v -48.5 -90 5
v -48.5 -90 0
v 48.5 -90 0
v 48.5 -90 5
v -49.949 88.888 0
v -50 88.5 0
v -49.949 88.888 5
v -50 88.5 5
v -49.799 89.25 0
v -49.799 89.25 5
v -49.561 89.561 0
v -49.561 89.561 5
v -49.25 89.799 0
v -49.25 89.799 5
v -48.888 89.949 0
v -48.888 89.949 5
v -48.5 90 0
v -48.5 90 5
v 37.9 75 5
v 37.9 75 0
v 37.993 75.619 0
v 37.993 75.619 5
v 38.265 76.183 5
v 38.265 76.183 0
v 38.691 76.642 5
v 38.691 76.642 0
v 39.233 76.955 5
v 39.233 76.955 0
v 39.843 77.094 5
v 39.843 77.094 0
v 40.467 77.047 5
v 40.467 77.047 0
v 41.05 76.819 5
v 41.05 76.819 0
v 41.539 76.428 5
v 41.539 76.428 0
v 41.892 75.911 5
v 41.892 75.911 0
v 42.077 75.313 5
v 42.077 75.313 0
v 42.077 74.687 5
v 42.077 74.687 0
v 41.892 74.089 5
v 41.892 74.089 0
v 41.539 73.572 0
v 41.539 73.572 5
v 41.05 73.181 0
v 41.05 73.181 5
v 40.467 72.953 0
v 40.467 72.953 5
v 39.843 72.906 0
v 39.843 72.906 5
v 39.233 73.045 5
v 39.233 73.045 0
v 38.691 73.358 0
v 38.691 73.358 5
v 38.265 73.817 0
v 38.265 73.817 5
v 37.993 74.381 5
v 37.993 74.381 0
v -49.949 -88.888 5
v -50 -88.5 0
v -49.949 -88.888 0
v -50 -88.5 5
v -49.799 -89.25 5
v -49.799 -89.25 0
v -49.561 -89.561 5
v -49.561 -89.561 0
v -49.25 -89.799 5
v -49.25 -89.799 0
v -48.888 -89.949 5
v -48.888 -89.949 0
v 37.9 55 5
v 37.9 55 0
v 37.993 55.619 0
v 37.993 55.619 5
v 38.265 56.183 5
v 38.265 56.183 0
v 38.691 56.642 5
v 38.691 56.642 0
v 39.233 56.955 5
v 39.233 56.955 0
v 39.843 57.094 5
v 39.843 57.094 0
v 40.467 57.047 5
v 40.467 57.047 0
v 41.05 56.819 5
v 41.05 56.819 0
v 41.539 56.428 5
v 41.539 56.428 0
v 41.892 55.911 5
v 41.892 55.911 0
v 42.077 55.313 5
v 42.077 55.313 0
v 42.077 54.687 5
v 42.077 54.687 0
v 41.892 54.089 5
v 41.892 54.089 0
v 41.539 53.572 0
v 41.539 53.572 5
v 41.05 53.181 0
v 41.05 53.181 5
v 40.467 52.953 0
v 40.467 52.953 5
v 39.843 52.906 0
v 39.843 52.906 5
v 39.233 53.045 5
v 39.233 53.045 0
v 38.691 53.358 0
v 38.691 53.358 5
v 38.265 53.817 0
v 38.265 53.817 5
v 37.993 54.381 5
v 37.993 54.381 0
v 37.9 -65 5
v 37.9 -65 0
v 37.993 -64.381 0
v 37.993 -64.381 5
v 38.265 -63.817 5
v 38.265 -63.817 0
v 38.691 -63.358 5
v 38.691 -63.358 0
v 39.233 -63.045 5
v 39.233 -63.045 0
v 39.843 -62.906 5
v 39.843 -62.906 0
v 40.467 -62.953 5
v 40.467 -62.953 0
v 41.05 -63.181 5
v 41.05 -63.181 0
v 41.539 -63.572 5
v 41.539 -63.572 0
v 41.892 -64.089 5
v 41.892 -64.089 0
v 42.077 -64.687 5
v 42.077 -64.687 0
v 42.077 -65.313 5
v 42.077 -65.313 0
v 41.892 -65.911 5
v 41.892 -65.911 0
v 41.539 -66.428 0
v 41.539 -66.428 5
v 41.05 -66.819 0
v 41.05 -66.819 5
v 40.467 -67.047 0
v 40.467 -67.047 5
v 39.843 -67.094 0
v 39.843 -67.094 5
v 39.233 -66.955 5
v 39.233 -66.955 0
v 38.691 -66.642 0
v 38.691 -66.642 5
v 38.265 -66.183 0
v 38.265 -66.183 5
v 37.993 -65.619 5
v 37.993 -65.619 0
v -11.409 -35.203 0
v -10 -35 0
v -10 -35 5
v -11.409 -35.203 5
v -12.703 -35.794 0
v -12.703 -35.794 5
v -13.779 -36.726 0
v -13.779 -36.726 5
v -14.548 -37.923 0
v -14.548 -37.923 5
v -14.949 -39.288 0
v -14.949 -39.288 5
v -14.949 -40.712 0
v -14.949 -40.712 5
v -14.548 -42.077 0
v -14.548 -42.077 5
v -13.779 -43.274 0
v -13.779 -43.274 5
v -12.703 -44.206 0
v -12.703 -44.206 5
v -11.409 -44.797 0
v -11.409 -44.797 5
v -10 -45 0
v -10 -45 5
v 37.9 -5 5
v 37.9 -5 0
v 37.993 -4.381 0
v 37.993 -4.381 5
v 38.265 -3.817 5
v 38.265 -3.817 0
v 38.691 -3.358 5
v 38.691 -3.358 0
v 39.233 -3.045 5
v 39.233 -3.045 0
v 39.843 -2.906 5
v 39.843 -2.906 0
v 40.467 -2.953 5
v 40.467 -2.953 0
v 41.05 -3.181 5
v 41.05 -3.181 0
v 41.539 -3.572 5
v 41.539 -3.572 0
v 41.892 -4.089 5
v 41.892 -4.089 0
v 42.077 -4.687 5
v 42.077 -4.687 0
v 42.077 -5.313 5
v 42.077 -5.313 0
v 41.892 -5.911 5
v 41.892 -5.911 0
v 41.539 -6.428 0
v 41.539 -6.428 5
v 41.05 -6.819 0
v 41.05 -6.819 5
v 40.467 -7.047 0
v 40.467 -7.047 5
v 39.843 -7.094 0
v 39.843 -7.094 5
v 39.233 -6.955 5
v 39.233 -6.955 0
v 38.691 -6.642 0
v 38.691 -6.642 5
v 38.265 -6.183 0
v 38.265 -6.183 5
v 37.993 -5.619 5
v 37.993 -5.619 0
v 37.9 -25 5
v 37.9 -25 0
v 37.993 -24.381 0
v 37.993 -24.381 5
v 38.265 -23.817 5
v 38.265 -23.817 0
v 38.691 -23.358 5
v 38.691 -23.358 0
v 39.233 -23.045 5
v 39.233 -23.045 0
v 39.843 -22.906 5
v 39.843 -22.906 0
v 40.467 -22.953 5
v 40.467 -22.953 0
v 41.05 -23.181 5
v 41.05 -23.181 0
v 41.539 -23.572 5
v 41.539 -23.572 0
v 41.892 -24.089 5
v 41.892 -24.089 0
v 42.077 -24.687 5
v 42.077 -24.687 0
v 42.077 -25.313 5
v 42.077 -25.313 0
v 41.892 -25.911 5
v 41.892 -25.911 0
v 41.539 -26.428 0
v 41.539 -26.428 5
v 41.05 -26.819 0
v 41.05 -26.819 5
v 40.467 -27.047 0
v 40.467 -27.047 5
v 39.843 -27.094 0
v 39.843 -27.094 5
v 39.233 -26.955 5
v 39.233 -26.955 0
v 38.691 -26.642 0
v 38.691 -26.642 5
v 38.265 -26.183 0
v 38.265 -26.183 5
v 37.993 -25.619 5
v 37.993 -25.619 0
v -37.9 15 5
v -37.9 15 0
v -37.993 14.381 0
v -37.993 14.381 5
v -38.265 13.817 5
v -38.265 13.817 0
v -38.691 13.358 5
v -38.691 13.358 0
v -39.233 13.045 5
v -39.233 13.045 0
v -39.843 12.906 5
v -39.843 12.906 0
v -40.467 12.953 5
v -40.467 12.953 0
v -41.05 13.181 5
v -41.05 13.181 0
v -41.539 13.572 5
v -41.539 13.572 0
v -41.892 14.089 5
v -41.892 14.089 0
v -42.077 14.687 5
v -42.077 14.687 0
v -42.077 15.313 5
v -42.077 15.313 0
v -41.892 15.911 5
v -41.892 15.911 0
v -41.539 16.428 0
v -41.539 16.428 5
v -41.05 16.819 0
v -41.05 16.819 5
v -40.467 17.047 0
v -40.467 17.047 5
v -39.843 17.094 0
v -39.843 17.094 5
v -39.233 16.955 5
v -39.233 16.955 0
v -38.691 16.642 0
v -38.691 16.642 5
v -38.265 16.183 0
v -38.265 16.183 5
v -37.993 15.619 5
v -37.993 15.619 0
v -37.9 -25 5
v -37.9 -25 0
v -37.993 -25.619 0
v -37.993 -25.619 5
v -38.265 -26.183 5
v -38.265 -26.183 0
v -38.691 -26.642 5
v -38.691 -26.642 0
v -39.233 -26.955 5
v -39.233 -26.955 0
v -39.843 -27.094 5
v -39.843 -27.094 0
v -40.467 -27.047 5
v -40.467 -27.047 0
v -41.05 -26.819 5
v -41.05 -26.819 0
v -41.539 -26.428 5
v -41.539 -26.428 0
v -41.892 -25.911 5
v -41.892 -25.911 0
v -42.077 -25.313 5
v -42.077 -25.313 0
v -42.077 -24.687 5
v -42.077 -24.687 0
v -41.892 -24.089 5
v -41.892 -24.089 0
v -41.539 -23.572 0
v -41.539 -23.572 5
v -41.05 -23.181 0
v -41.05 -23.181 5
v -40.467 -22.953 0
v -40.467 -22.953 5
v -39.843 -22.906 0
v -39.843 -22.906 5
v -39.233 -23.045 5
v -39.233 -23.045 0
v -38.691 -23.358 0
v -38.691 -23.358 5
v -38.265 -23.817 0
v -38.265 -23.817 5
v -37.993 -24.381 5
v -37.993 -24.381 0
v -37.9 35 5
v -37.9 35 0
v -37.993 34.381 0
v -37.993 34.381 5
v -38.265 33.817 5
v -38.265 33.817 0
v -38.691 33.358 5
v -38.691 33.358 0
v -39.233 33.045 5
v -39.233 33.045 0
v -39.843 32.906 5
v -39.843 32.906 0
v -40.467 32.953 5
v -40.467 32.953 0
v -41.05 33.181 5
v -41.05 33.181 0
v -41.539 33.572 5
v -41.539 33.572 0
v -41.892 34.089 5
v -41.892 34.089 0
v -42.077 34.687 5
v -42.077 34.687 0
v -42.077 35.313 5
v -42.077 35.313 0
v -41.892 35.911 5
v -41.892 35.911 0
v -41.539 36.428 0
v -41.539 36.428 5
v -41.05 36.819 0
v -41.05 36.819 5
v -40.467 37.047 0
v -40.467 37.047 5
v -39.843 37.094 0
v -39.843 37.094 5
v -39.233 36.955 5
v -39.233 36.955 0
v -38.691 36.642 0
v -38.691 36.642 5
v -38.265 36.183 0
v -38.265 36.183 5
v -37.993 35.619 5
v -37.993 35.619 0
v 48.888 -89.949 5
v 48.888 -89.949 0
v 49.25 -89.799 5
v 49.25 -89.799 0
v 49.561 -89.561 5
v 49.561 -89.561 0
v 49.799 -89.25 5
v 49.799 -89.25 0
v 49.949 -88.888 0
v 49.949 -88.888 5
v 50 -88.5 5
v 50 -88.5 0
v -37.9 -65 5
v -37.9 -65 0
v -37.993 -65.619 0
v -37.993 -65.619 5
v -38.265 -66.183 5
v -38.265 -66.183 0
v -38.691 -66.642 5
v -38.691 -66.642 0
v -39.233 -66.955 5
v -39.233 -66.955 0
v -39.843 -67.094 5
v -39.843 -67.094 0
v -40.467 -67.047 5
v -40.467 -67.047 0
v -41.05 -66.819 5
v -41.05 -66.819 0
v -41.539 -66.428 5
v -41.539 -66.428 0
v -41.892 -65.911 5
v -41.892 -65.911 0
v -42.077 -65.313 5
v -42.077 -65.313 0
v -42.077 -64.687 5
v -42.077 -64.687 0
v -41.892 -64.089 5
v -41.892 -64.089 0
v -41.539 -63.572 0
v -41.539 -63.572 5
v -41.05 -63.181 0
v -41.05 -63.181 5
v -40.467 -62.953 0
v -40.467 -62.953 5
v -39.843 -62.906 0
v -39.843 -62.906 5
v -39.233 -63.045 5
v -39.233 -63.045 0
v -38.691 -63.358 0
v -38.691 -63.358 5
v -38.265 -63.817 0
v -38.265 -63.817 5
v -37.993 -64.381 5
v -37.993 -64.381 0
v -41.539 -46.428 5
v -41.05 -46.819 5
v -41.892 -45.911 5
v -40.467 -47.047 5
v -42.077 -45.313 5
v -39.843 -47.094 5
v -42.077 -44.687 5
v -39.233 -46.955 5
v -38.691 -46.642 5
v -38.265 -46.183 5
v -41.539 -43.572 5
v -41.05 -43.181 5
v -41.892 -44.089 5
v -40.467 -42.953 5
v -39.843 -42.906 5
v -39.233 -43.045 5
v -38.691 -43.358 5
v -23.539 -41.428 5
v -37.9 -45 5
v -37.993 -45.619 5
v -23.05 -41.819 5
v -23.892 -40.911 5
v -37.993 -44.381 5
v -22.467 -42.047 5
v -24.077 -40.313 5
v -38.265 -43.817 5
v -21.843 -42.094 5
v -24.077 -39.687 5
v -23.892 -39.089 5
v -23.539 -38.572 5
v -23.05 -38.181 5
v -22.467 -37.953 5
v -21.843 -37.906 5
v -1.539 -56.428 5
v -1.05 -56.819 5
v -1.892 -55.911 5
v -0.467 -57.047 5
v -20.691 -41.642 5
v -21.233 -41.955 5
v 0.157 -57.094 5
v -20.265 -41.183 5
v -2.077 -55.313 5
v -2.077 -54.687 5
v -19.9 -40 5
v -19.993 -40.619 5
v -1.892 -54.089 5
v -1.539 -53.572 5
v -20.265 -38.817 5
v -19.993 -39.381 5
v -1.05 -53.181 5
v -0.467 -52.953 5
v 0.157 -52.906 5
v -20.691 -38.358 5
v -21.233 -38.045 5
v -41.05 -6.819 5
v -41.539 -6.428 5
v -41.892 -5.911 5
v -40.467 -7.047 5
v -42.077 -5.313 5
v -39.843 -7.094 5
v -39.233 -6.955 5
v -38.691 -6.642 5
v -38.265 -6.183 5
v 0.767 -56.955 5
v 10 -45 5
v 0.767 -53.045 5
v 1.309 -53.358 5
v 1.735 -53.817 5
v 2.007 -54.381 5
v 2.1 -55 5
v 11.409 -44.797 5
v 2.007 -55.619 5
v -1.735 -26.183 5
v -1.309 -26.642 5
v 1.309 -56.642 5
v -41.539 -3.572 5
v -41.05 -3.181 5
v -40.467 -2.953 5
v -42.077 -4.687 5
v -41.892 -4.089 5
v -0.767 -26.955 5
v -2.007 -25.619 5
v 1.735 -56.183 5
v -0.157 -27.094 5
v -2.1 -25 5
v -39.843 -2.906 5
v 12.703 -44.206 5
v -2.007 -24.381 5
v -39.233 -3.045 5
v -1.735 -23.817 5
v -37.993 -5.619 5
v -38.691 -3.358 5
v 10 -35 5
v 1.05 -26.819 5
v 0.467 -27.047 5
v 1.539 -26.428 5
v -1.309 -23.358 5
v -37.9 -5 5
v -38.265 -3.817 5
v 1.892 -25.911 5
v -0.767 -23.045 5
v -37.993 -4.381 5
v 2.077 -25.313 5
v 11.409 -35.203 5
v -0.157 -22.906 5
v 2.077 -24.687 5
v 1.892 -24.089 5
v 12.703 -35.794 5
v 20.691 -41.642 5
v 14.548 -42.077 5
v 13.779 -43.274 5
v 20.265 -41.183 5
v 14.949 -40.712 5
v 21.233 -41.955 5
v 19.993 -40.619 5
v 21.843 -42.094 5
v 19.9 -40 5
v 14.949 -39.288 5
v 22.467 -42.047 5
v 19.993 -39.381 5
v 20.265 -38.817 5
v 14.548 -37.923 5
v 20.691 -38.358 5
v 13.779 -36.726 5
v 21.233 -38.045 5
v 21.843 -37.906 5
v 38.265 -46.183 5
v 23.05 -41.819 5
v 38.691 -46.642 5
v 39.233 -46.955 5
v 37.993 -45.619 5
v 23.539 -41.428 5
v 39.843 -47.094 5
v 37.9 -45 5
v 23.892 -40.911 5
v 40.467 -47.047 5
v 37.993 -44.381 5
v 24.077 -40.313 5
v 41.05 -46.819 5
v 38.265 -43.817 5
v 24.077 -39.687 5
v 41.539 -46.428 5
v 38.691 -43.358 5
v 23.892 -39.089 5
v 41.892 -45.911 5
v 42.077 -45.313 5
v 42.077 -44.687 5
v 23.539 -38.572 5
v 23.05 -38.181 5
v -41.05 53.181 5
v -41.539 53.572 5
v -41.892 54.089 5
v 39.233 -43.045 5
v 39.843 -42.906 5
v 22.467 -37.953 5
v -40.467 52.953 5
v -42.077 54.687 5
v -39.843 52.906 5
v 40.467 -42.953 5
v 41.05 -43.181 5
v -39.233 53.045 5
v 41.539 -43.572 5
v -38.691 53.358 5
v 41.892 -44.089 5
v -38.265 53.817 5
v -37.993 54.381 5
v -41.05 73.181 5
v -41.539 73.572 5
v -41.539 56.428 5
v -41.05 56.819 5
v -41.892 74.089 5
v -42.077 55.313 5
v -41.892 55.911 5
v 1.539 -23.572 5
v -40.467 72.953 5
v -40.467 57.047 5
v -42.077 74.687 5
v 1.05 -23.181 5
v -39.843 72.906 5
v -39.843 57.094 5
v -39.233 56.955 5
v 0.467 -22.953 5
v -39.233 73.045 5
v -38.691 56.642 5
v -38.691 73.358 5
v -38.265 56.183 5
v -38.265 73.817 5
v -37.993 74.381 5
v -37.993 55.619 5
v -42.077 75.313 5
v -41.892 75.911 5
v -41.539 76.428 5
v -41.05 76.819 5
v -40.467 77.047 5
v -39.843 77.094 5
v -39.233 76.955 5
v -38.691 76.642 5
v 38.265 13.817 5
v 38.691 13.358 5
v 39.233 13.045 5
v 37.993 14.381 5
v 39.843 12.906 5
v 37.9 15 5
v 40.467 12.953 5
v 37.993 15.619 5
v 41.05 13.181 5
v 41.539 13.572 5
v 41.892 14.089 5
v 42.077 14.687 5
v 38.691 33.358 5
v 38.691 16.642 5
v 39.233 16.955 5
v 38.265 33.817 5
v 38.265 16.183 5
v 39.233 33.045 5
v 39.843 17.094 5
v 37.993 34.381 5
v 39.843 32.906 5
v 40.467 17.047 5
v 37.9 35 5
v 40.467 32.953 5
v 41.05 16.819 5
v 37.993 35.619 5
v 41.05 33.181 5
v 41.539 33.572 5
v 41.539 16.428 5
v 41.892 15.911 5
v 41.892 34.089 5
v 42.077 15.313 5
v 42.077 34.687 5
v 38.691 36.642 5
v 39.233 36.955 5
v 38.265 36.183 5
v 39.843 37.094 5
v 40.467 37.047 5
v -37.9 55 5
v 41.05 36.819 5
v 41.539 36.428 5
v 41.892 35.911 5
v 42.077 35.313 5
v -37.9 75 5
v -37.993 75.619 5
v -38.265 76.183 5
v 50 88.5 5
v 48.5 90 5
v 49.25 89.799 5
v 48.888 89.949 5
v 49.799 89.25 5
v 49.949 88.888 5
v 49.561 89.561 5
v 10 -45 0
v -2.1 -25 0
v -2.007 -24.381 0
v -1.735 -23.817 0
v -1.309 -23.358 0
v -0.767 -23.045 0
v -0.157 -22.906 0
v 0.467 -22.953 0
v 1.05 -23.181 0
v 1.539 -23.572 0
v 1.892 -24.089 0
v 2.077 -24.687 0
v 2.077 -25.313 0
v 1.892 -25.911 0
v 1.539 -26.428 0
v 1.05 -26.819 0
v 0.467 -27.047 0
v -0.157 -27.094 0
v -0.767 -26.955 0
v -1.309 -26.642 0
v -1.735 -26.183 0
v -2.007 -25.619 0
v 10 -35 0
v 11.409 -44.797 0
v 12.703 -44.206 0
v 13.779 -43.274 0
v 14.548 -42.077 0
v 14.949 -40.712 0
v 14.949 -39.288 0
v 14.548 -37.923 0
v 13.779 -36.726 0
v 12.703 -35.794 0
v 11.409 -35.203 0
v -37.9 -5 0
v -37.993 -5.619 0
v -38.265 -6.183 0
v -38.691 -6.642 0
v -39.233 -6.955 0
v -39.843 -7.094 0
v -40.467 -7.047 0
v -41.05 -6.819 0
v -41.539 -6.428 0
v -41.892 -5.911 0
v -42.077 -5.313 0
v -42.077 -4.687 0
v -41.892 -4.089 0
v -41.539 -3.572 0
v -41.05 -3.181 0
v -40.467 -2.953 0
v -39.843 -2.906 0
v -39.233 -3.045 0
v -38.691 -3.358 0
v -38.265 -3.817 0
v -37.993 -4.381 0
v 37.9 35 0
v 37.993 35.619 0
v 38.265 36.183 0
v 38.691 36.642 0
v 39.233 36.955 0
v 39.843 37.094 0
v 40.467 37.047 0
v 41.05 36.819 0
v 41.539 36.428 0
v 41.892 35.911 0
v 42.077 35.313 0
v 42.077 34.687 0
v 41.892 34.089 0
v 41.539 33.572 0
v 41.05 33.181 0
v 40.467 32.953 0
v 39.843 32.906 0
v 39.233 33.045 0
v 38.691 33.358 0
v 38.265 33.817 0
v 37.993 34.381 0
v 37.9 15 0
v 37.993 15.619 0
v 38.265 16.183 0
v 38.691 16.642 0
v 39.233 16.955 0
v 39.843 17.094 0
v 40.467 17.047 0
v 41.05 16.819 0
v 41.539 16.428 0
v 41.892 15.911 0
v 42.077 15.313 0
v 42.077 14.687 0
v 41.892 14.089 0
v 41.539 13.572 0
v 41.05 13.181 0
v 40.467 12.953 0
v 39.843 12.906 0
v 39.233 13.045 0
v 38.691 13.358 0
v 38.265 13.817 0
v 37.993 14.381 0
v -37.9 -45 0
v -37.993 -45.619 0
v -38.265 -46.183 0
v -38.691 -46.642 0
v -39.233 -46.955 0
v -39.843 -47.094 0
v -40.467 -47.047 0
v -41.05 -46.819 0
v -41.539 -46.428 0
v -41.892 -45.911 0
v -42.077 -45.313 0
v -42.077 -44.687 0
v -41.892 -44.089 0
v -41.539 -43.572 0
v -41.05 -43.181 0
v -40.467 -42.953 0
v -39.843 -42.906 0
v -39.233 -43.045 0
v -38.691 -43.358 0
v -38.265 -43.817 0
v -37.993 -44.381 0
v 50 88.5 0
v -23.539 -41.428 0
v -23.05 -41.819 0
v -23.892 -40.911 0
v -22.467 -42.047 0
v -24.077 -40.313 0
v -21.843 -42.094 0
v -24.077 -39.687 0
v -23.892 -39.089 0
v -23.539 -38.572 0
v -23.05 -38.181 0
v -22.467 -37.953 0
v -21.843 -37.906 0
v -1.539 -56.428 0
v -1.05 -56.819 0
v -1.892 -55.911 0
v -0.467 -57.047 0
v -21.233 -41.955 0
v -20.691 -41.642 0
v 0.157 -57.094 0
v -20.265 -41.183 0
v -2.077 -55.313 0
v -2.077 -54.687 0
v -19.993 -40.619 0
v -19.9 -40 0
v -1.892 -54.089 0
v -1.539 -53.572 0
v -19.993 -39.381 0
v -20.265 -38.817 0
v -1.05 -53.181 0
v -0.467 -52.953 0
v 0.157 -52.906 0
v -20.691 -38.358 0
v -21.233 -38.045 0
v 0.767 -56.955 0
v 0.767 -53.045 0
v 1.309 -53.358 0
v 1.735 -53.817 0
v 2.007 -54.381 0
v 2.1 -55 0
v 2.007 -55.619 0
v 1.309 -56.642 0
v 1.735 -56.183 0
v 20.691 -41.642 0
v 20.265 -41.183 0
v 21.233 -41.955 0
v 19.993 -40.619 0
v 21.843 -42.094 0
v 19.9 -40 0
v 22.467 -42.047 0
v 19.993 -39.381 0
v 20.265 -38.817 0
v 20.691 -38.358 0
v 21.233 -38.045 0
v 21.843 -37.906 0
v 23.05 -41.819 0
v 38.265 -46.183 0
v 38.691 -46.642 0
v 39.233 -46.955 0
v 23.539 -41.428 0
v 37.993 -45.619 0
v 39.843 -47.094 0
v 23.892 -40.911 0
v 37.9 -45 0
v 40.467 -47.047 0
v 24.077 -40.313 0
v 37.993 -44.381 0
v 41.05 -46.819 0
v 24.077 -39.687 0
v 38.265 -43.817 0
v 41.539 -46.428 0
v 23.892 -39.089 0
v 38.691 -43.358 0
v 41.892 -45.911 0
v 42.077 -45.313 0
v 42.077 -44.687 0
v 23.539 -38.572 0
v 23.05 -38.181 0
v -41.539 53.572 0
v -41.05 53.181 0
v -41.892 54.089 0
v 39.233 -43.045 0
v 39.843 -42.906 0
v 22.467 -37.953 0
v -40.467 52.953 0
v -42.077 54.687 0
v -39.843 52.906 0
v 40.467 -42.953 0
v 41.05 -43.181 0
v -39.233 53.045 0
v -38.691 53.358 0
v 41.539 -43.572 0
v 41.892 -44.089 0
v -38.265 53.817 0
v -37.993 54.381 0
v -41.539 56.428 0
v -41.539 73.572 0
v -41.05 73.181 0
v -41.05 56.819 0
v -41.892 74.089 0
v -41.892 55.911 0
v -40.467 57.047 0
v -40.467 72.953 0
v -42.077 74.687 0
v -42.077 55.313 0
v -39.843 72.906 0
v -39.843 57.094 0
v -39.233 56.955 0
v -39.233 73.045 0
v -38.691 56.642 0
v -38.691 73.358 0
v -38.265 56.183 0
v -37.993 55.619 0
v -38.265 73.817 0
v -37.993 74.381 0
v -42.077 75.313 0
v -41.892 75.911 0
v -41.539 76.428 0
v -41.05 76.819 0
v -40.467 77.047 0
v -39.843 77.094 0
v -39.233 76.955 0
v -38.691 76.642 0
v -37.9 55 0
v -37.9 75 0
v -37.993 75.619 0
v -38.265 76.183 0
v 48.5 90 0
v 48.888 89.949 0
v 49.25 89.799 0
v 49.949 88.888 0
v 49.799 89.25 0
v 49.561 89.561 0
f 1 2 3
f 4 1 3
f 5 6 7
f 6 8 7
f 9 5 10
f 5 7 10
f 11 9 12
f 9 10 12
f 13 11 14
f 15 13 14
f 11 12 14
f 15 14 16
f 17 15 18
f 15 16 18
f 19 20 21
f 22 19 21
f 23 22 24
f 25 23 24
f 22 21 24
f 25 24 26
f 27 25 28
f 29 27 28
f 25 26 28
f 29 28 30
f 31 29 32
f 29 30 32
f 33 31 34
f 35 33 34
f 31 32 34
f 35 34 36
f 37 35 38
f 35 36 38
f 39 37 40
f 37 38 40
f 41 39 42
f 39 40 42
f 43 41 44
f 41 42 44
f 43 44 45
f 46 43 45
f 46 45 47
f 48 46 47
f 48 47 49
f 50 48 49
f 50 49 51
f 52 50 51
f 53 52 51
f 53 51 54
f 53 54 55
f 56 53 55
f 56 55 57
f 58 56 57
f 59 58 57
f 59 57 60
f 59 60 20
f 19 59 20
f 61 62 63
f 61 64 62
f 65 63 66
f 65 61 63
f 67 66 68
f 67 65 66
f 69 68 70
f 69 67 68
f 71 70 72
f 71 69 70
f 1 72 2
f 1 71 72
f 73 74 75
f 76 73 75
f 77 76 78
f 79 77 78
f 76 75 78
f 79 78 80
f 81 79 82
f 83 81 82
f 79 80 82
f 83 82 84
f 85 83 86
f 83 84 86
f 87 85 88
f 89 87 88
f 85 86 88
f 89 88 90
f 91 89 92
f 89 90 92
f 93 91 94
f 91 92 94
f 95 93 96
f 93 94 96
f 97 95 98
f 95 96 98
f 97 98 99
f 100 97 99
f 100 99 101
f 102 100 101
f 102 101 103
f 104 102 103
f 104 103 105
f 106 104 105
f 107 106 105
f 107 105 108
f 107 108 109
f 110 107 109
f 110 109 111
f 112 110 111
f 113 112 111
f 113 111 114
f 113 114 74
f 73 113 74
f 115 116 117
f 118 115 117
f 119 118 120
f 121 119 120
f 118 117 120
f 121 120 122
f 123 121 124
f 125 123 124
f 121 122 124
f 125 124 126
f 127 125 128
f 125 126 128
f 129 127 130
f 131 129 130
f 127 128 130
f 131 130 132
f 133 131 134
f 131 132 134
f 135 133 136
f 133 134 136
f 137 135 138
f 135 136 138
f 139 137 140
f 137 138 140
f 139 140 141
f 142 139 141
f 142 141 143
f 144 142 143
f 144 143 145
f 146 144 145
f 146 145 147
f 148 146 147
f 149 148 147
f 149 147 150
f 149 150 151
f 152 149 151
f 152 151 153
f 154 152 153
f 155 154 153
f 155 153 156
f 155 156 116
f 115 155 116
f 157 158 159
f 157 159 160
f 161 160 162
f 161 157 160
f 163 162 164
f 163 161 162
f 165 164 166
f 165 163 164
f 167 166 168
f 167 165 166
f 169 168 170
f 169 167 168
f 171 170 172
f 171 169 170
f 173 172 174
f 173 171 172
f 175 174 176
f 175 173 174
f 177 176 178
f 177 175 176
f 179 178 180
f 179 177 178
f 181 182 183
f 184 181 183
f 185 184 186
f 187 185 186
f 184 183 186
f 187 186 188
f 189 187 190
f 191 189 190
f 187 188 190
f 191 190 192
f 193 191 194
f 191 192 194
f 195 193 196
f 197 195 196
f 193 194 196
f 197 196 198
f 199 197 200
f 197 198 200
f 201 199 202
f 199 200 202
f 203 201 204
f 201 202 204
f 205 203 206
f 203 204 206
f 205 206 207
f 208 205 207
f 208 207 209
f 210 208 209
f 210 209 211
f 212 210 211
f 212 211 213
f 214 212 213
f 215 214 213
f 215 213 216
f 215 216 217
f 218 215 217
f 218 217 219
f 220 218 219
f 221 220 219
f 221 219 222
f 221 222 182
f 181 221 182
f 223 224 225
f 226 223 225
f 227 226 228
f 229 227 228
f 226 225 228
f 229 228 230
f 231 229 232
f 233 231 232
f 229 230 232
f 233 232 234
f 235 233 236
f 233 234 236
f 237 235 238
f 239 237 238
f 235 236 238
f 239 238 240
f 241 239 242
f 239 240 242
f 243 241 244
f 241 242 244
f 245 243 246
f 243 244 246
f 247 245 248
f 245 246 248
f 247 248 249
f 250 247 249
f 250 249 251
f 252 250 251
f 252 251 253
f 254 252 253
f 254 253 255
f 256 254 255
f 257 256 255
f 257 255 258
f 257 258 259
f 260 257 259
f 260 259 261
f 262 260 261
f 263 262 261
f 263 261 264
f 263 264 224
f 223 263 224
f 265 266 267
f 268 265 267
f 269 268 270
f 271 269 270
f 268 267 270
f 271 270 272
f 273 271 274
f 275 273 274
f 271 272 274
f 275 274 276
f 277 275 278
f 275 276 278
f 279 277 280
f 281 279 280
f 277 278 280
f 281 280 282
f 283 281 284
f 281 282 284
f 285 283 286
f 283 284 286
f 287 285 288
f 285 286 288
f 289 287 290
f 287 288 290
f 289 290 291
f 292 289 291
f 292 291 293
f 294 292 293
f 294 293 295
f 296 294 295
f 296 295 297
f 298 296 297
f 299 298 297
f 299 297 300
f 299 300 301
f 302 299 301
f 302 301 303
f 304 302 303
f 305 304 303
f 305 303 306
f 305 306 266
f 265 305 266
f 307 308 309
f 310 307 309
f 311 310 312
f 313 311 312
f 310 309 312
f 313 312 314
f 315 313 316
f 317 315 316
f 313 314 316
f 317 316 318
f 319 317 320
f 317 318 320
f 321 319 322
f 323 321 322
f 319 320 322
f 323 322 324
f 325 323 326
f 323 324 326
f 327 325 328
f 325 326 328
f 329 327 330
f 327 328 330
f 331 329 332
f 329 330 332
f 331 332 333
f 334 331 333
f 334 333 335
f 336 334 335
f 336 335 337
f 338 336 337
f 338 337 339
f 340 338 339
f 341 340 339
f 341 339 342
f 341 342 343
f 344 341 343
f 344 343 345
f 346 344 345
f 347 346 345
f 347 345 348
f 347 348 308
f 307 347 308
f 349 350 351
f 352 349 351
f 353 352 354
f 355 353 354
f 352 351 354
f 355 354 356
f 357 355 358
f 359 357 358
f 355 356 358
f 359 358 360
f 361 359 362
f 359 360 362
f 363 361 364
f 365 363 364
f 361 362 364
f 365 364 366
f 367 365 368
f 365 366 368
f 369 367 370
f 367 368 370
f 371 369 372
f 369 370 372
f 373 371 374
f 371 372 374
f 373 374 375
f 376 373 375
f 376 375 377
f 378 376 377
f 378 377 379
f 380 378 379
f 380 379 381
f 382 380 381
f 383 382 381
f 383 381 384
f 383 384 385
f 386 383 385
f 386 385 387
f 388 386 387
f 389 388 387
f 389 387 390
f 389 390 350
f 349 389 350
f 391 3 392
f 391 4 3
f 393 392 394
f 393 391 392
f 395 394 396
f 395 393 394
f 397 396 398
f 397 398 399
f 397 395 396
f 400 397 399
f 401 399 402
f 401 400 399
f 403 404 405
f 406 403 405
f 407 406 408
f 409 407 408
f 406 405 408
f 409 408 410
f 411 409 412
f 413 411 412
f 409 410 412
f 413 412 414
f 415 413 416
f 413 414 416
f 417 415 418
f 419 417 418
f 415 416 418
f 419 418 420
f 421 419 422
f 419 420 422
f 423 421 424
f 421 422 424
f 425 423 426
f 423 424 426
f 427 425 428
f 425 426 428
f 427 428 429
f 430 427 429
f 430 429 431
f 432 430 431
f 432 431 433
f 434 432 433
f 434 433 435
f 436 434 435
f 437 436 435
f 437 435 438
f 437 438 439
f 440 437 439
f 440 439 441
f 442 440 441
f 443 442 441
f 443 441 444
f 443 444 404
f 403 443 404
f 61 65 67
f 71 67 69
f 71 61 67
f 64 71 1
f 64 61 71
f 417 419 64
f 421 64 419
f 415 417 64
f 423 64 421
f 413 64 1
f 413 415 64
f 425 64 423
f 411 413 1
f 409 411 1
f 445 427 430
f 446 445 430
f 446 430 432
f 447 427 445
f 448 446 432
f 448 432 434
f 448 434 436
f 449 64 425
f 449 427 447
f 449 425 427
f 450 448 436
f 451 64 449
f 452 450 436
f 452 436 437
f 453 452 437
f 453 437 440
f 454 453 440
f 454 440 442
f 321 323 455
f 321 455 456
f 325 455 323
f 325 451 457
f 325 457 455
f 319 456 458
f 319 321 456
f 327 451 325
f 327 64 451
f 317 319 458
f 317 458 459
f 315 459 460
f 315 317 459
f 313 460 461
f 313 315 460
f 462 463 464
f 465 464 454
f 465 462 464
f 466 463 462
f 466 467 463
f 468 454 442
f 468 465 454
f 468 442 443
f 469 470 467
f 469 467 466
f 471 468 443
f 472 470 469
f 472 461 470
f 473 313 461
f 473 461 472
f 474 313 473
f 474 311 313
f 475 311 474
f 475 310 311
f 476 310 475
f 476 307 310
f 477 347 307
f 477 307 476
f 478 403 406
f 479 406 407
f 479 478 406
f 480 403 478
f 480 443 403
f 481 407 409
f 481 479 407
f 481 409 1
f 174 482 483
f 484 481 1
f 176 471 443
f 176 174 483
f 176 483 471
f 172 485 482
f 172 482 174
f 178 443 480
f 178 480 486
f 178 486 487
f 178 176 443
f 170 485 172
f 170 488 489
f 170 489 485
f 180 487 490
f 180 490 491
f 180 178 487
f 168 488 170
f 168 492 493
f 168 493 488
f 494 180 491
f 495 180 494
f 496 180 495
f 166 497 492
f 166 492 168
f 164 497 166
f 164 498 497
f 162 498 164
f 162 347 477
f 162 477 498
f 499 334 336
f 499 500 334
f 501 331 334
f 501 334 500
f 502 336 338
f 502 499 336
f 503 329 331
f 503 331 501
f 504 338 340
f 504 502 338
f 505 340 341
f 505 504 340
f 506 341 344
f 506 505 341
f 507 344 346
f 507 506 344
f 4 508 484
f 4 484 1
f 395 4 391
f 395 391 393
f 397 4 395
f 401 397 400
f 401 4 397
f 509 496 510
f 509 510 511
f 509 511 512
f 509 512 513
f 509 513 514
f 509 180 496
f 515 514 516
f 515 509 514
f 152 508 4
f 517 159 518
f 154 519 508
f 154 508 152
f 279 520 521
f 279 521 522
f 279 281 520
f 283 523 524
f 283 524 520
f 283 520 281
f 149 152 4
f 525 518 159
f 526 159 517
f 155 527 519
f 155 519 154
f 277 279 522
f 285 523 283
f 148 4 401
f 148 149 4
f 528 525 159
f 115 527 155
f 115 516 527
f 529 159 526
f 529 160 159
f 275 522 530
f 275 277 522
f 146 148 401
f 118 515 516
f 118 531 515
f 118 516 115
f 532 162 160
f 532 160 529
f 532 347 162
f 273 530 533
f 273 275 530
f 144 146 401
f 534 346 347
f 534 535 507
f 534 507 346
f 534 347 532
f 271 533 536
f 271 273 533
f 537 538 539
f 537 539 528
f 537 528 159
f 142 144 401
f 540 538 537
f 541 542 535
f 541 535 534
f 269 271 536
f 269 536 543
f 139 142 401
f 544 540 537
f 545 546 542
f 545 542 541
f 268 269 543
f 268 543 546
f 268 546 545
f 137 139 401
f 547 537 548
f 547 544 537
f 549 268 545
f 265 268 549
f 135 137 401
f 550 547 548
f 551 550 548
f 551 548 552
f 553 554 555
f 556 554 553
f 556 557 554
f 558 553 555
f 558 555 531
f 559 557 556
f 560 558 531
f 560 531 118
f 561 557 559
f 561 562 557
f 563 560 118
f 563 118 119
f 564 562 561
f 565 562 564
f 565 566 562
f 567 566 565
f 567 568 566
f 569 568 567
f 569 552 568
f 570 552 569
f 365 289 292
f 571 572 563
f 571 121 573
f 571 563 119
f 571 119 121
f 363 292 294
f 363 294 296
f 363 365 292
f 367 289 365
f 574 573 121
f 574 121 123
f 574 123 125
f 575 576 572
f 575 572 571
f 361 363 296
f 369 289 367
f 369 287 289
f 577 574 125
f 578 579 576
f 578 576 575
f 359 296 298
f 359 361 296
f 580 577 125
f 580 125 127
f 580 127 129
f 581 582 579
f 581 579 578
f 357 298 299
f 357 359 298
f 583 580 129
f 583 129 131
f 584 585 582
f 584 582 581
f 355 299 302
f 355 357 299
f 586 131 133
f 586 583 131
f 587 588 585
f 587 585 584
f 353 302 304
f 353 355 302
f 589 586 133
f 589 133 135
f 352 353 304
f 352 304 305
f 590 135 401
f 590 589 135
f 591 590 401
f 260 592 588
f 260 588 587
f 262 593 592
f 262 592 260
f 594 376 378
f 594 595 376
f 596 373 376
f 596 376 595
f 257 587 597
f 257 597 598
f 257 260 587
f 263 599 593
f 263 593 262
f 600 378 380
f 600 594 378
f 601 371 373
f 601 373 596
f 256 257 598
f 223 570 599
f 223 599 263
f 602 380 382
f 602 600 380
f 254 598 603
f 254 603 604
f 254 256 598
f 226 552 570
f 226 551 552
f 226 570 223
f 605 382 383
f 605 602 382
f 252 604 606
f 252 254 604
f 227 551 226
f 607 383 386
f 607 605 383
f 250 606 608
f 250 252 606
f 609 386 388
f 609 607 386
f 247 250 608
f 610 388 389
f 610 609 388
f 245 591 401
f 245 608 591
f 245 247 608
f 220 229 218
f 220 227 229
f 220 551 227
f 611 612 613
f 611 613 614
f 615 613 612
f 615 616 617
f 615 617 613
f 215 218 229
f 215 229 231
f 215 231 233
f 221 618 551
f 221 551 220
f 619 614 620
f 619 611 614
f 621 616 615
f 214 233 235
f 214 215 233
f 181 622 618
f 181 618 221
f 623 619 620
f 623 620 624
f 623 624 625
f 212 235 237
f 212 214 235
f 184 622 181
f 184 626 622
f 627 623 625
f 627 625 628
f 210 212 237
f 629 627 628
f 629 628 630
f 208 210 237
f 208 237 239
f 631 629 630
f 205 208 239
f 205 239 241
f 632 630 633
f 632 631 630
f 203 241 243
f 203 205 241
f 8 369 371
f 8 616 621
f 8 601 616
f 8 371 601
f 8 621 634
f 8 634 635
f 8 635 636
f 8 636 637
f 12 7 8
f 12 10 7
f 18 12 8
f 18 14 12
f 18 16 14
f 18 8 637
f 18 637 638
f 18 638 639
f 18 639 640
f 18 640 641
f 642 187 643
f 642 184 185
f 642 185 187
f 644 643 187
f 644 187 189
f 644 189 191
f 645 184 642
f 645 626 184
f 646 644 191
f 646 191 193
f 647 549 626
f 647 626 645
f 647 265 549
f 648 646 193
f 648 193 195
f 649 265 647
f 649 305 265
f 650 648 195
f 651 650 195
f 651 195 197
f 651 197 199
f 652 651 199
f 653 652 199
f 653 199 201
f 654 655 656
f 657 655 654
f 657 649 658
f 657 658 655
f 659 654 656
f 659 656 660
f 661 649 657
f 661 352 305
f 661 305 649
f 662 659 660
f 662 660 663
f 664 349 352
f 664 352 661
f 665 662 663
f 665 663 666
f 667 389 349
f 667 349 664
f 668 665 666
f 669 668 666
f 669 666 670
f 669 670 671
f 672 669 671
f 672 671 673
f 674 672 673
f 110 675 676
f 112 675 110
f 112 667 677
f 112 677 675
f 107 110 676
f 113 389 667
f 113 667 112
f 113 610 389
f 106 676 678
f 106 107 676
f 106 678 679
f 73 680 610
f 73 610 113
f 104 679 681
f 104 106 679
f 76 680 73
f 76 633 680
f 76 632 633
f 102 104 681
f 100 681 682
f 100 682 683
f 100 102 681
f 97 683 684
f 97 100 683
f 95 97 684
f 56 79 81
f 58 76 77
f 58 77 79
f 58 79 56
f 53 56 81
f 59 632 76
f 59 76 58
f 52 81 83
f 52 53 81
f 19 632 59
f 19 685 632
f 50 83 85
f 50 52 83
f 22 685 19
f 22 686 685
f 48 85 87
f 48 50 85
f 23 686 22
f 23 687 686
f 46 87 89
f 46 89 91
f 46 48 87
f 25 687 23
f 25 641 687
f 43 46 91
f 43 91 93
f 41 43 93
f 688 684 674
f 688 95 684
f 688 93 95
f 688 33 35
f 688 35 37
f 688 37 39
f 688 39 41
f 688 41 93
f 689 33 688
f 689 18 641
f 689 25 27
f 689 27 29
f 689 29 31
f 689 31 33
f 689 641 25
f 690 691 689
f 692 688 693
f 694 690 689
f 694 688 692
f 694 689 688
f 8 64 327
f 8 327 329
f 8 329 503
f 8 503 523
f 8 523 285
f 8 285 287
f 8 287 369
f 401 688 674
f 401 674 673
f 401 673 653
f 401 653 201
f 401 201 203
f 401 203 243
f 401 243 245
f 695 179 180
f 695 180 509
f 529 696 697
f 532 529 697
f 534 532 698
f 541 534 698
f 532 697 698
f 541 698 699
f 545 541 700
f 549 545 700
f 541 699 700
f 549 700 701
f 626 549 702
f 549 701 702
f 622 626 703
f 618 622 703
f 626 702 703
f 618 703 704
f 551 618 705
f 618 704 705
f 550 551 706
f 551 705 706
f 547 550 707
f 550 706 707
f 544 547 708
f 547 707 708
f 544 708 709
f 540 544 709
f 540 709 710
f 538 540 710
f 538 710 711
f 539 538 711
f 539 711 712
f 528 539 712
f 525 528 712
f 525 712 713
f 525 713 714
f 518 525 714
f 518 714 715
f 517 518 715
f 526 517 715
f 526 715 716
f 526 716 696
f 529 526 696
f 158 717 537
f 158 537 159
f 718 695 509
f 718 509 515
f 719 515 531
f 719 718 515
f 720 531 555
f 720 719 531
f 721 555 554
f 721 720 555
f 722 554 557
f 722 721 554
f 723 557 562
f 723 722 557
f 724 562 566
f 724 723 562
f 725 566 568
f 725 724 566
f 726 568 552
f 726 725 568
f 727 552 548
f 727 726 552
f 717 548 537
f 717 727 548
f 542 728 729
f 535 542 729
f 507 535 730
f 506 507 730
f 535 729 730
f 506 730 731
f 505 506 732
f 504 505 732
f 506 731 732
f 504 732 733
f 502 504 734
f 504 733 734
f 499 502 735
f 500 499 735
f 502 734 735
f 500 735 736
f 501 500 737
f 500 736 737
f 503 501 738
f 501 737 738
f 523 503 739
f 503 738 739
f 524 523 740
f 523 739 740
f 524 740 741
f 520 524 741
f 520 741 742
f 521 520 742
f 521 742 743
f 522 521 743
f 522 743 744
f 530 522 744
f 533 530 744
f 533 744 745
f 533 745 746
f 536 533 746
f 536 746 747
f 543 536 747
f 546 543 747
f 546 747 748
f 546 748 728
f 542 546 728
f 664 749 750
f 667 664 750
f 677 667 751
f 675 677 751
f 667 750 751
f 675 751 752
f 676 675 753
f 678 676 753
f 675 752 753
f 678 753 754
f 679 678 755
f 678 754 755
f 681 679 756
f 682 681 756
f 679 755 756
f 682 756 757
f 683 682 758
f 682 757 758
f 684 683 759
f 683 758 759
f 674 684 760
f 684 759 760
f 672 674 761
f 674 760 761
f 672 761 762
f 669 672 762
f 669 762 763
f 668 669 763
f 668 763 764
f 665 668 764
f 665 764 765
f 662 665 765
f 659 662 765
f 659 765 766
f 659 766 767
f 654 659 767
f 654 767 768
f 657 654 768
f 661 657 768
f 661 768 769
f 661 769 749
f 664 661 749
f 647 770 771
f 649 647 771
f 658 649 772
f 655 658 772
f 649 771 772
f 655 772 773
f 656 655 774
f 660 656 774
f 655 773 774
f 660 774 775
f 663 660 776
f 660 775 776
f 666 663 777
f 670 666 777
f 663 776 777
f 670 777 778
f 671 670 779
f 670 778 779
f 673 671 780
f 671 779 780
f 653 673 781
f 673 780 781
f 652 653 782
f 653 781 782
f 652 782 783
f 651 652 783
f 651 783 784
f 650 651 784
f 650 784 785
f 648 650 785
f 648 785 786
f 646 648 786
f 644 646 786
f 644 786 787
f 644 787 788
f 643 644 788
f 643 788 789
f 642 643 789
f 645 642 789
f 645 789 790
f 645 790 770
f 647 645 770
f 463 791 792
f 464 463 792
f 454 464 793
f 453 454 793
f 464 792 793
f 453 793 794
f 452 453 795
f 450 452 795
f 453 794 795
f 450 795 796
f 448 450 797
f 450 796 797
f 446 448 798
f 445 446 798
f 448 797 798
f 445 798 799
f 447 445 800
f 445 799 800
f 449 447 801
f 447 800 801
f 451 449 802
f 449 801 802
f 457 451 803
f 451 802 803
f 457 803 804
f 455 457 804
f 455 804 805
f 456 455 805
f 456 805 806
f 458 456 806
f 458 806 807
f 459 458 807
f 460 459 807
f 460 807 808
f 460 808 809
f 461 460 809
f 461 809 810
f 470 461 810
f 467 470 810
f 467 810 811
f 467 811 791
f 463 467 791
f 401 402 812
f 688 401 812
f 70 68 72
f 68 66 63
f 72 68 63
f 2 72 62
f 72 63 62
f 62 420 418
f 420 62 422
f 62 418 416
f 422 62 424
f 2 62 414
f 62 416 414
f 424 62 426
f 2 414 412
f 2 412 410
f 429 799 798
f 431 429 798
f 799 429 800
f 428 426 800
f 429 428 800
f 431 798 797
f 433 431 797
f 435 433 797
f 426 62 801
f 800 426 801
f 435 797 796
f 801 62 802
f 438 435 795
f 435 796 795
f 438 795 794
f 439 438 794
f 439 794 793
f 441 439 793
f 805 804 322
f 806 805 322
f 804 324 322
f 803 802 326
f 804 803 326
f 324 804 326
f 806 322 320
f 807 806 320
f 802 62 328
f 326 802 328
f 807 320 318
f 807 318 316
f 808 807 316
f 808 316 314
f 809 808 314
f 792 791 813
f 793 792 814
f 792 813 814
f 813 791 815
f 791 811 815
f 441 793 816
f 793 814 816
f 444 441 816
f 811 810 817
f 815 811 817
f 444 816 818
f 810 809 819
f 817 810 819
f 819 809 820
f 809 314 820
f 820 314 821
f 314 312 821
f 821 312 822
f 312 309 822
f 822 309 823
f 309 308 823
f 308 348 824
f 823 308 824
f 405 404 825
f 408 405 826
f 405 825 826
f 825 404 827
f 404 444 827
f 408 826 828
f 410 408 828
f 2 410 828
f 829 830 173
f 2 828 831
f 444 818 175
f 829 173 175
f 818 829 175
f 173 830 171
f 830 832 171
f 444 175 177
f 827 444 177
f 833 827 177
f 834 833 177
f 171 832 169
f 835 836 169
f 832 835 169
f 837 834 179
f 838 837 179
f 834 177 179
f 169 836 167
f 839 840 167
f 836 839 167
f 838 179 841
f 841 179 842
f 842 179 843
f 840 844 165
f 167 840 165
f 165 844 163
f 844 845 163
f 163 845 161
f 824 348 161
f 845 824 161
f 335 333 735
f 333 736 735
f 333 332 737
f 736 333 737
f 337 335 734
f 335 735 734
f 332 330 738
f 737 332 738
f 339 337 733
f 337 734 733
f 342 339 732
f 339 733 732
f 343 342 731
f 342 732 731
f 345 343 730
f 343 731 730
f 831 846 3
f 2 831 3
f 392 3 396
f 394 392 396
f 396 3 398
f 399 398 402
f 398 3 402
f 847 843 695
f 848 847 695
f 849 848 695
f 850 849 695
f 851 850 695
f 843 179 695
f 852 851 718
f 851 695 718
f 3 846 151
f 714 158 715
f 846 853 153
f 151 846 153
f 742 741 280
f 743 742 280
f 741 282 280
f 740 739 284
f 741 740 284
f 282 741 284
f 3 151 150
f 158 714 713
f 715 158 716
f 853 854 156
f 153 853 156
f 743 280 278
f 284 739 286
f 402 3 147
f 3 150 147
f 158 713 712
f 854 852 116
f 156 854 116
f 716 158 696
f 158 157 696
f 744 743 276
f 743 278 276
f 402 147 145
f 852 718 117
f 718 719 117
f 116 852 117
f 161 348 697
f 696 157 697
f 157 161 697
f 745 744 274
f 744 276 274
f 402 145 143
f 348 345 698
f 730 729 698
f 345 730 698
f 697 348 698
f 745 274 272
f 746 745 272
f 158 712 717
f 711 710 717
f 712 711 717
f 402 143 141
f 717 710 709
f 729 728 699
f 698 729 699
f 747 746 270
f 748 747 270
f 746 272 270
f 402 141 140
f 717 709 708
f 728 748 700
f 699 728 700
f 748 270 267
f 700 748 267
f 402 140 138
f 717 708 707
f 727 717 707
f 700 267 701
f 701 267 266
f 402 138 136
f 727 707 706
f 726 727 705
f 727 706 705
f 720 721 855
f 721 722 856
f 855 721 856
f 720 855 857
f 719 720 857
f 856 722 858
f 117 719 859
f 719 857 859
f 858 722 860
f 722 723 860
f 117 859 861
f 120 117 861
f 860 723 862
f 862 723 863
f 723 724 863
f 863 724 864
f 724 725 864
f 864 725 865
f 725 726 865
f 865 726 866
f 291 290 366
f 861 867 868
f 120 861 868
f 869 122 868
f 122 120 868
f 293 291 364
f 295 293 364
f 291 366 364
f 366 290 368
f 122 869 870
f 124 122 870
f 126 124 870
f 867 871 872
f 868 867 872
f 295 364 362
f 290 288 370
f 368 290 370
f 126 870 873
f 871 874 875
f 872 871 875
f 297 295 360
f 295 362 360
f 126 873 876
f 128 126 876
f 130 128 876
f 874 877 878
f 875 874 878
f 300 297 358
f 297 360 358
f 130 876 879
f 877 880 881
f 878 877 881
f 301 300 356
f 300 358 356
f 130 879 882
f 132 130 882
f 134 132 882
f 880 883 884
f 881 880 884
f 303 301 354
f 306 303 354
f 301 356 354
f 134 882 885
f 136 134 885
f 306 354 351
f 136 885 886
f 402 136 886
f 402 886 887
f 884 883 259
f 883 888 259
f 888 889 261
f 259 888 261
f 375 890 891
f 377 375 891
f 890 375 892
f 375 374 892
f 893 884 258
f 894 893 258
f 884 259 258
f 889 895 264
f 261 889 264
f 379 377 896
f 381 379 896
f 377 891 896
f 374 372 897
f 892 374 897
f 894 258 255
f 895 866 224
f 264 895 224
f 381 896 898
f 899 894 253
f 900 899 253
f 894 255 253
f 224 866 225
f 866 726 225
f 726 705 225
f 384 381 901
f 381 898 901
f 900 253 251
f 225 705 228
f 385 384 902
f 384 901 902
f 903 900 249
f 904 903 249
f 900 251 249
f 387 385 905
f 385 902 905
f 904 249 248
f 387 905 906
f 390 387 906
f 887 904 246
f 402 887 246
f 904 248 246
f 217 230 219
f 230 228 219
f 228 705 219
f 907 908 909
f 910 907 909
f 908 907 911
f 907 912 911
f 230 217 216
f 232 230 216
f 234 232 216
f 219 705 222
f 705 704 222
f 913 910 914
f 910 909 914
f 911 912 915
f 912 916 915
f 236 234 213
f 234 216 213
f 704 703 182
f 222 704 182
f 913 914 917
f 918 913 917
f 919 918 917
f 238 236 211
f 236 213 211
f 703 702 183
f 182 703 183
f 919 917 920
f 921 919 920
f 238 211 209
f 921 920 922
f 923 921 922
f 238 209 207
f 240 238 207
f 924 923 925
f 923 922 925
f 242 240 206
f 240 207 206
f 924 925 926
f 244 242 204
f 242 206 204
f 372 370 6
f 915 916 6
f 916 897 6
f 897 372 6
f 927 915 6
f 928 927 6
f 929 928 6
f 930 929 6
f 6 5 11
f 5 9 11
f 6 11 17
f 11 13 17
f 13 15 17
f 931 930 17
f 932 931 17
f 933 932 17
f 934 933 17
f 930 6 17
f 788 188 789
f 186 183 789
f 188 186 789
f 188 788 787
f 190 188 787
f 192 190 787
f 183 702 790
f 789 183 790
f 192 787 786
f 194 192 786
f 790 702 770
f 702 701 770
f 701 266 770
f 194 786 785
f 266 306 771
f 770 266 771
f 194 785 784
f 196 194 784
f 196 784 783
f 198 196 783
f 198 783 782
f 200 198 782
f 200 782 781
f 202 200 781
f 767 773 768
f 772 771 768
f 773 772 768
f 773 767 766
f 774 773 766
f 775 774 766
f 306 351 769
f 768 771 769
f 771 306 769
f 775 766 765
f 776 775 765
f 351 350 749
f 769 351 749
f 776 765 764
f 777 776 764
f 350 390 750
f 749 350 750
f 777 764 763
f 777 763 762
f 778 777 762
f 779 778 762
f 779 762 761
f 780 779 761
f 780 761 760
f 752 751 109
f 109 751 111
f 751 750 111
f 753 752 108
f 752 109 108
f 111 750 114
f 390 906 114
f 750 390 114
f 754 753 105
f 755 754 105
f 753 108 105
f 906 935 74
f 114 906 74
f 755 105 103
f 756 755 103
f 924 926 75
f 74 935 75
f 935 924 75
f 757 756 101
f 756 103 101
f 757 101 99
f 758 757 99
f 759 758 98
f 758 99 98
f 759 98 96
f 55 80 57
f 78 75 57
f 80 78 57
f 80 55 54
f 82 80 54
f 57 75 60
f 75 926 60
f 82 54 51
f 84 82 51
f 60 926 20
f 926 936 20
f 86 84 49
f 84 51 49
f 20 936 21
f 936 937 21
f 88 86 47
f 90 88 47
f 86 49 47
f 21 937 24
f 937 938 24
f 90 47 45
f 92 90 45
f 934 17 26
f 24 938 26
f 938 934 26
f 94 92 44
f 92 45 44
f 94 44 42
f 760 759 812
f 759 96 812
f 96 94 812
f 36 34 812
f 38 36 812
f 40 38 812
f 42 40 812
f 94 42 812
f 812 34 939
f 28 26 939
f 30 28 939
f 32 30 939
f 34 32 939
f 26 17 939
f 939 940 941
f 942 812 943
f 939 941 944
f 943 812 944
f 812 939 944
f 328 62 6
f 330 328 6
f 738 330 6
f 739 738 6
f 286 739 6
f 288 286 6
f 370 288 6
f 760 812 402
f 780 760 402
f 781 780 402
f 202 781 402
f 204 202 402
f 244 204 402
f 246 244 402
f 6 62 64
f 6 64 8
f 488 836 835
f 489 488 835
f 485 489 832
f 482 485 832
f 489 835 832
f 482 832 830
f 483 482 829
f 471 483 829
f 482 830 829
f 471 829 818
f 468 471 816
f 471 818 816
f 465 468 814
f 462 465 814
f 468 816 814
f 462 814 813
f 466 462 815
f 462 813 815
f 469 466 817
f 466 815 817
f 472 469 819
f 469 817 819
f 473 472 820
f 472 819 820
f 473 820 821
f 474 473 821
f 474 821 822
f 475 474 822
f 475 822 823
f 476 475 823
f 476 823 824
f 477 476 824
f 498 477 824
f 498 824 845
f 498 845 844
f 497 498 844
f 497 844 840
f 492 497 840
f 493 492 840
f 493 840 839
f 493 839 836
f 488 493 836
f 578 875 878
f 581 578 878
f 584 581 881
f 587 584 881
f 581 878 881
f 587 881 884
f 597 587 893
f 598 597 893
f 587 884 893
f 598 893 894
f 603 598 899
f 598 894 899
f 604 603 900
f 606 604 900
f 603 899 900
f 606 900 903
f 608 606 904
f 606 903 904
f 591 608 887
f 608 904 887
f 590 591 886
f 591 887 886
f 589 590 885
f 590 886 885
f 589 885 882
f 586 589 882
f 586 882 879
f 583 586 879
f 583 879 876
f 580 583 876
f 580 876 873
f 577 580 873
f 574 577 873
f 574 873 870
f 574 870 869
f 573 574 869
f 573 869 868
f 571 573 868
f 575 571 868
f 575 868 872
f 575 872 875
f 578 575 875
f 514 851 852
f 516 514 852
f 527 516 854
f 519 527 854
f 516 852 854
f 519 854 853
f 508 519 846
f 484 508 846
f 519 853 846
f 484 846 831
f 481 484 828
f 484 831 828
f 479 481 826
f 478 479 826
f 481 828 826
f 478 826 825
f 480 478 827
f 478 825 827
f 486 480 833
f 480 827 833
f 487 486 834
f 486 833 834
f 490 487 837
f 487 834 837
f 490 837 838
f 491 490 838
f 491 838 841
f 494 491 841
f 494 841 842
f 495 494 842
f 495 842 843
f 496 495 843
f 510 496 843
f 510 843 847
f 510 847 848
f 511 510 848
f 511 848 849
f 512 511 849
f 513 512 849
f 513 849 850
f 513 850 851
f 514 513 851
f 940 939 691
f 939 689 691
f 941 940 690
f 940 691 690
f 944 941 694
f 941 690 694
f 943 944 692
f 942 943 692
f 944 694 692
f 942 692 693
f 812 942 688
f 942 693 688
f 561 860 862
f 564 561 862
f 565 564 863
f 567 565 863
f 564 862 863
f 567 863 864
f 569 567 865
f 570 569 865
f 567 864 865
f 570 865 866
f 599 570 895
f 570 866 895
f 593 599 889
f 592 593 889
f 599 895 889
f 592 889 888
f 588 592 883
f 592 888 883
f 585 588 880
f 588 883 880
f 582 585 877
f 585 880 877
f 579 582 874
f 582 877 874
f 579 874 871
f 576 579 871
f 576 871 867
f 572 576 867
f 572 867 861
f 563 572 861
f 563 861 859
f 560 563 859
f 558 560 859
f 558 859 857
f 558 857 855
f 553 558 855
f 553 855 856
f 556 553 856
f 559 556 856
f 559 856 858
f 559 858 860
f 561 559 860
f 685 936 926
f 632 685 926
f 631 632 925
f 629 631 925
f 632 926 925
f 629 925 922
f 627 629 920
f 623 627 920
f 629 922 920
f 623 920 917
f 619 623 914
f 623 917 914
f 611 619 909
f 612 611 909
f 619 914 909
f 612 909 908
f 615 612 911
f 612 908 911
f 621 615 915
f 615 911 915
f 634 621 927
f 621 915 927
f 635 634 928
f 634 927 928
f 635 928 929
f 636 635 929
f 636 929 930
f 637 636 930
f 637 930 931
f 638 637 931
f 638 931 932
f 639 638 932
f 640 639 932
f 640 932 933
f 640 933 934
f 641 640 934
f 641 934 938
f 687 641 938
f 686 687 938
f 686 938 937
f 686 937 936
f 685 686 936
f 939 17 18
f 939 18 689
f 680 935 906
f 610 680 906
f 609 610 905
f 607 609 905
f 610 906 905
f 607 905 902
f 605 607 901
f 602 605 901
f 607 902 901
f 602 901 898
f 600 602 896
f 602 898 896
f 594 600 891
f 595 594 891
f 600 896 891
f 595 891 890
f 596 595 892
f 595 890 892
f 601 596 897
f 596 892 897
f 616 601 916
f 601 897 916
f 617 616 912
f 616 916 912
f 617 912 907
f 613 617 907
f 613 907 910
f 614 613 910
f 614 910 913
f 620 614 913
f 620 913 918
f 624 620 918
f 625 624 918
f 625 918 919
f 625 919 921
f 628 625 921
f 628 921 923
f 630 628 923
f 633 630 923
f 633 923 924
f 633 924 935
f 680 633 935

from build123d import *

# Parameters (mm, degrees)
SKETCH1_W           = 100
SKETCH1_H           = 180
BOSS_EXTRUDE1_DEPTH = 5
SKETCH2_R           = 2.1
CUT_EXTRUDE1_DEPTH  = 104.07764064
FILLET1_R           = 1.5
SKETCH3_R           = 2.1
CUT_EXTRUDE2_DEPTH  = 104.07764064


with BuildPart() as part:
    # Sketch1 → Boss-Extrude1 (new body)
    with BuildSketch(Plane.XY):
        Rectangle(SKETCH1_W, SKETCH1_H)
    extrude(amount=BOSS_EXTRUDE1_DEPTH)

    # Sketch2 → Cut-Extrude1 (cut, through all)
    with BuildSketch(Plane(origin=(0, 0, 0), x_dir=(-1, 0, 0), z_dir=(0, 0, -1))):
        with Locations((-22, -40)):
            Circle(SKETCH2_R)
        with Locations((0, -25)):
            Circle(SKETCH2_R)
        with Locations(Location((22, -40, 0), (0, 0, 180))):
            Circle(SKETCH2_R)
        with Locations(Location((0, -55, 0), (0, 0, 180))):
            Circle(SKETCH2_R)
        with BuildLine():
            Line((-10, -35), (10, -35))
            ThreePointArc((10, -35), (15, -40), (10, -45))
            Line((10, -45), (-10, -45))
            ThreePointArc((-10, -45), (-15, -40), (-10, -35))
        make_face()
    extrude(amount=-CUT_EXTRUDE1_DEPTH, mode=Mode.SUBTRACT)

    # Fillet1
    fillet1_edges = [part.edges().sort_by_distance(p)[0] for p in [
        (50, -90, 2.5),
        (-50, -90, 2.5),
        (-50, 90, 2.5),
        (50, 90, 2.5),
    ]]
    fillet(fillet1_edges, radius=FILLET1_R)

    # Sketch3 → Cut-Extrude2 (cut, through all)
    with BuildSketch(Plane(origin=(0, 0, 0), x_dir=(-1, 0, 0), z_dir=(0, 0, -1))):
        with Locations((-40, 75)):
            Circle(SKETCH3_R)
        with Locations((-40, 55)):
            Circle(SKETCH3_R)
        with Locations((-40, 35)):
            Circle(SKETCH3_R)
        with Locations((-40, 15)):
            Circle(SKETCH3_R)
        with Locations((-40, -5)):
            Circle(SKETCH3_R)
        with Locations(Location((40, -5, 0), (0, 0, 180))):
            Circle(SKETCH3_R)
        with Locations(Location((40, 15, 0), (0, 0, 180))):
            Circle(SKETCH3_R)
        with Locations(Location((40, 35, 0), (0, 0, 180))):
            Circle(SKETCH3_R)
        with Locations(Location((40, 75, 0), (0, 0, 180))):
            Circle(SKETCH3_R)
        with Locations(Location((40, 55, 0), (0, 0, 180))):
            Circle(SKETCH3_R)
        with Locations((-40, -25)):
            Circle(SKETCH3_R)
        with Locations((-40, -45)):
            Circle(SKETCH3_R)
        with Locations((-40, -65)):
            Circle(SKETCH3_R)
        with Locations(Location((40, -65, 0), (0, 0, 180))):
            Circle(SKETCH3_R)
        with Locations(Location((40, -45, 0), (0, 0, 180))):
            Circle(SKETCH3_R)
        with Locations(Location((40, -25, 0), (0, 0, 180))):
            Circle(SKETCH3_R)
    extrude(amount=-CUT_EXTRUDE2_DEPTH, mode=Mode.SUBTRACT)


solid = part.part
